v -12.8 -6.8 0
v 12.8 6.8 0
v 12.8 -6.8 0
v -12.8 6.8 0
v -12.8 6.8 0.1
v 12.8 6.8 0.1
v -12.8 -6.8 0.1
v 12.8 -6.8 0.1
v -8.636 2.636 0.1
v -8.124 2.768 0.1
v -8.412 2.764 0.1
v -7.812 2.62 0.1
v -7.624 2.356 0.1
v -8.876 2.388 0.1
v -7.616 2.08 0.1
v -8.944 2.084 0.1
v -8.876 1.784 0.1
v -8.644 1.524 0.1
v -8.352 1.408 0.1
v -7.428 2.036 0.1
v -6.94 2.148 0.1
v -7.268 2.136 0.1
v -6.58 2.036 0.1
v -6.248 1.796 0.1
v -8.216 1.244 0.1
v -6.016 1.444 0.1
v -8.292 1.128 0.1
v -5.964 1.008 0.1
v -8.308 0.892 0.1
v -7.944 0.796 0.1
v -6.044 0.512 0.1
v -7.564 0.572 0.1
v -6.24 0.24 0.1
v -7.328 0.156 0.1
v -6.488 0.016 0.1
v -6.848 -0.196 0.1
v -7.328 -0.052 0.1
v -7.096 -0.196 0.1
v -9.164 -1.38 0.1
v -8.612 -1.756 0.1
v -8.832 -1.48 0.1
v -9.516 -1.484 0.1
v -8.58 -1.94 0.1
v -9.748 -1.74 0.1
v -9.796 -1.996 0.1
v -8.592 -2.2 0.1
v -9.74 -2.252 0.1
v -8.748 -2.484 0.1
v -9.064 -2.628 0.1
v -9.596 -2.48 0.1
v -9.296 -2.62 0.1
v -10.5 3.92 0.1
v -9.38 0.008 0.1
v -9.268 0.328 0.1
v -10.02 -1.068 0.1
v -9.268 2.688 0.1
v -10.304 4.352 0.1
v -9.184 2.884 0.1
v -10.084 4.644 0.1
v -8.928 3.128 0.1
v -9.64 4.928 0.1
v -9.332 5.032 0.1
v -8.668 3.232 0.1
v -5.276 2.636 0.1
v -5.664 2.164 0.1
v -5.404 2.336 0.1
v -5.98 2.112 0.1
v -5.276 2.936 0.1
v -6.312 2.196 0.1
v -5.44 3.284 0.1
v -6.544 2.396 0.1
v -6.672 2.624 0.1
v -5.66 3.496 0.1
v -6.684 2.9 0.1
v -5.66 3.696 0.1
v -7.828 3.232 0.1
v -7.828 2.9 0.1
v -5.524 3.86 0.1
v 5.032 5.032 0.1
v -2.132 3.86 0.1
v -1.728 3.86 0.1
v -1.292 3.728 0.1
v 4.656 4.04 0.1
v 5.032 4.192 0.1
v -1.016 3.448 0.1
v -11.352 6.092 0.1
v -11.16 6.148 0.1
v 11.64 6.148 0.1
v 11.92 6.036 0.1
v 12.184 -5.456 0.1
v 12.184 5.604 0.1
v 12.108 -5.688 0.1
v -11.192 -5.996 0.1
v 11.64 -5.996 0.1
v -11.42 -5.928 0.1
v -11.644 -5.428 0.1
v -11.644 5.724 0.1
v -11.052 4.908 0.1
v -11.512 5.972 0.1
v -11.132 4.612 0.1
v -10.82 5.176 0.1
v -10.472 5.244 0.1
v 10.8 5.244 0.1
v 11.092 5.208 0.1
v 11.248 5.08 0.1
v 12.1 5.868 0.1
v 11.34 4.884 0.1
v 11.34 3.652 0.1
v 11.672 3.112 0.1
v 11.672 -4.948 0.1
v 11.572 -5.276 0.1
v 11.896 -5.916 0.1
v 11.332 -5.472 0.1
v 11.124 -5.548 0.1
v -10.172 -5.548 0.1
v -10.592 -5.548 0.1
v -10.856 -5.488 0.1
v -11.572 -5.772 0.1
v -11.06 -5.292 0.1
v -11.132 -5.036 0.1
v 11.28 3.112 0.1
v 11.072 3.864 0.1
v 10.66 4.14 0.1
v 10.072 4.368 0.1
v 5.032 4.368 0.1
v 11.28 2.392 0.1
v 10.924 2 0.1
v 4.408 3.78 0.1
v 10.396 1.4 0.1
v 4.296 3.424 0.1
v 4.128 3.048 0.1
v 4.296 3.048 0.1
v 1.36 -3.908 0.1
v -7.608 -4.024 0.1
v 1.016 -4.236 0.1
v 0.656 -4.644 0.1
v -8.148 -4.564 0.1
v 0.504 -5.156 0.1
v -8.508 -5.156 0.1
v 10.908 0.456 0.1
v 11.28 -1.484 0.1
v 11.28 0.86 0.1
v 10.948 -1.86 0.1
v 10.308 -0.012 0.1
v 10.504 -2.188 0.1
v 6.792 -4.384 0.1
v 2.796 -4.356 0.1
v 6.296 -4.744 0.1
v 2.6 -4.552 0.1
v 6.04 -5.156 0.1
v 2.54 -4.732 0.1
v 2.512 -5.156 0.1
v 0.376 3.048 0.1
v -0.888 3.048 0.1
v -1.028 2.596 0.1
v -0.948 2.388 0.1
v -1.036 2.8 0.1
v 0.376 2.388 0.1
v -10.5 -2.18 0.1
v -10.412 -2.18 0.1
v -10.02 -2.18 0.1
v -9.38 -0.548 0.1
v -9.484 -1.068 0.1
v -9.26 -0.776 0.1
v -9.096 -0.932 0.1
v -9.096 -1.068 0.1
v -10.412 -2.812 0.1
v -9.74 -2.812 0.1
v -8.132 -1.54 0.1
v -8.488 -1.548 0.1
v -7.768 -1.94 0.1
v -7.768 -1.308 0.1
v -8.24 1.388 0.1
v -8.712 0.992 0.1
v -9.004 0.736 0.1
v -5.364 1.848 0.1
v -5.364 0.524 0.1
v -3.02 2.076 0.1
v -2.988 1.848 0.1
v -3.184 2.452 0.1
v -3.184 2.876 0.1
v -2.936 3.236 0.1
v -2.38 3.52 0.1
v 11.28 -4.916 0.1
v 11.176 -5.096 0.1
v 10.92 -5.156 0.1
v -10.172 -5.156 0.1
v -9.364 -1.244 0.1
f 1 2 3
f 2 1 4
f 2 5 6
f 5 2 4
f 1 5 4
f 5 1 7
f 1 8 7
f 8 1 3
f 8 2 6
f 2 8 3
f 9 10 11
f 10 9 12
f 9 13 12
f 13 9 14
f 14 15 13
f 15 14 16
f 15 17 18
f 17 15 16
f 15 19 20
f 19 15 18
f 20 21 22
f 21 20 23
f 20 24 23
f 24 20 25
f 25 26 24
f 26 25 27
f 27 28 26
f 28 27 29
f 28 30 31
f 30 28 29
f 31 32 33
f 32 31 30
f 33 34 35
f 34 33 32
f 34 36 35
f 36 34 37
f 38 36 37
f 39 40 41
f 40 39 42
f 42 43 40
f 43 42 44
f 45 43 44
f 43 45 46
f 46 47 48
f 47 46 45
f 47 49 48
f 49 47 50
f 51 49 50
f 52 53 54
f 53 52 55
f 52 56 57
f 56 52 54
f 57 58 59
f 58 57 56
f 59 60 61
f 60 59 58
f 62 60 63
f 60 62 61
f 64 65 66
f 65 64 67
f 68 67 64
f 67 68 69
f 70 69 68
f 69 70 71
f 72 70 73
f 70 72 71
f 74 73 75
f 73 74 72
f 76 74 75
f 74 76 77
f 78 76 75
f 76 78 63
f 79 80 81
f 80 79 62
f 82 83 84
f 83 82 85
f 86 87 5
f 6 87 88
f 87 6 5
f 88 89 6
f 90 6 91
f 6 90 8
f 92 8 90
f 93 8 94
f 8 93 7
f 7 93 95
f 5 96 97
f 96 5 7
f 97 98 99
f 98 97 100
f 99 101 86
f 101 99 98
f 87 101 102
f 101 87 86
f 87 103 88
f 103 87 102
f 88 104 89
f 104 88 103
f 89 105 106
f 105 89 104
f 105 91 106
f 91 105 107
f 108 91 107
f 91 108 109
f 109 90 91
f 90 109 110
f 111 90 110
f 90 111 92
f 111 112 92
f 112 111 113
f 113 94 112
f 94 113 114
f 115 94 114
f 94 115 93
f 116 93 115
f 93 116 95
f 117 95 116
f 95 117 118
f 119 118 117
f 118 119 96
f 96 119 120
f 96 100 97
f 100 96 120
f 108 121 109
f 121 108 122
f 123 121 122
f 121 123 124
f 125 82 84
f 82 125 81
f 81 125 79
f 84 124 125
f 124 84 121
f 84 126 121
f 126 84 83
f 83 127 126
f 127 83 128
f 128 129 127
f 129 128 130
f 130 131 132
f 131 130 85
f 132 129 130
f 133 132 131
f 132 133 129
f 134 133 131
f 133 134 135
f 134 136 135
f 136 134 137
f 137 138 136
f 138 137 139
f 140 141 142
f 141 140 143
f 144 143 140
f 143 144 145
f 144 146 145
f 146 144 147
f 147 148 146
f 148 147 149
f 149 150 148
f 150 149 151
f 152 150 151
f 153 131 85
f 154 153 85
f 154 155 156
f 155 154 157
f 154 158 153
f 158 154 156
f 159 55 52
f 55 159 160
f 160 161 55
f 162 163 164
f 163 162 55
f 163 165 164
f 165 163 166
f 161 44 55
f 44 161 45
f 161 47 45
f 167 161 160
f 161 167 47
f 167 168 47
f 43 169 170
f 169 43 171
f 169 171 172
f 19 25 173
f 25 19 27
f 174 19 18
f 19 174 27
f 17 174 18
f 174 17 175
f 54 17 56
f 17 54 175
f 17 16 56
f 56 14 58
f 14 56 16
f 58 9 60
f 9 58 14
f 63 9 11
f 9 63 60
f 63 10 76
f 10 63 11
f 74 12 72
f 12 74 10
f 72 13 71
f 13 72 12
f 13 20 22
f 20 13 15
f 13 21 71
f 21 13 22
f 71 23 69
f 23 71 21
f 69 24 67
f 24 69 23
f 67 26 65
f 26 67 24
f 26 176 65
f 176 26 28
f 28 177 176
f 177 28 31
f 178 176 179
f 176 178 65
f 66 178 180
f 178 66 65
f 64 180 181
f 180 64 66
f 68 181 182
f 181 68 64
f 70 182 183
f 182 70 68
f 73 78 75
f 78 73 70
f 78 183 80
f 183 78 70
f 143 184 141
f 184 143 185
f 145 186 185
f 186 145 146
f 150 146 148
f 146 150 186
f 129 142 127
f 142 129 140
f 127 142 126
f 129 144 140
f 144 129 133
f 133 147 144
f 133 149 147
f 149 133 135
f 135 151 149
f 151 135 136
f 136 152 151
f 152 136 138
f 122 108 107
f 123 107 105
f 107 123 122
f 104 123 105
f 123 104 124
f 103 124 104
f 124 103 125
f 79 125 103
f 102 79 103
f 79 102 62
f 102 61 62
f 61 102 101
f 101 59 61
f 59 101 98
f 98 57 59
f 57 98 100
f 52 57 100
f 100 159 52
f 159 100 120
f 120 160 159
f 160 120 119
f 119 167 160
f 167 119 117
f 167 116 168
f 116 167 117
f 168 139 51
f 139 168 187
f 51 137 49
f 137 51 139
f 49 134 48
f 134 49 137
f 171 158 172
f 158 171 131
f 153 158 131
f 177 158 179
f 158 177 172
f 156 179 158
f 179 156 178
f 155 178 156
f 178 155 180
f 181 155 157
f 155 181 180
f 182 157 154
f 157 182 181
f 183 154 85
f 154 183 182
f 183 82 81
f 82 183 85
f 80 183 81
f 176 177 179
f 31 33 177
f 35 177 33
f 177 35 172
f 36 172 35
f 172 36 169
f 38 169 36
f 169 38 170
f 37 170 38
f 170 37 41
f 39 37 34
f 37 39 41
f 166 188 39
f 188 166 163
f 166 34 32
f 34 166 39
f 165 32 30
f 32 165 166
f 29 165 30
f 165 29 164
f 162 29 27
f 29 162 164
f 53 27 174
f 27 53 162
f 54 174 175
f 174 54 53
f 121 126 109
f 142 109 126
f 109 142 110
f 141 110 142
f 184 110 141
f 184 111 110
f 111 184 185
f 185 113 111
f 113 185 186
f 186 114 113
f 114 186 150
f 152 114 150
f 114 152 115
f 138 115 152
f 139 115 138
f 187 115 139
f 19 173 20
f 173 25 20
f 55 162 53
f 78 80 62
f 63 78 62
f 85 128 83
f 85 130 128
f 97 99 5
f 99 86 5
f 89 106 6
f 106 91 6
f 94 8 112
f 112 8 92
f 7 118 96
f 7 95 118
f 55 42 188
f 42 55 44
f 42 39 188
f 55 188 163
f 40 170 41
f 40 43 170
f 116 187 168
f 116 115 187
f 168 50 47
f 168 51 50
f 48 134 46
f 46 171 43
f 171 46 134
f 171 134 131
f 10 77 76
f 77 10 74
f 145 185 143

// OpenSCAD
// file: ../p/box5-12.scad
use <../lib.scad>
function ldraw_lib__box5_12() = [
// 0 Box with 5 Faces without Any Edges
// 0 Name: box5-12.dat
// 0 Author: Chris Dee [cwdee]
// 0 !LDRAW_ORG Primitive UPDATE 2009-02
// 0 !LICENSE Licensed under CC BY 2.0 and CC BY 4.0 : see CAreadme.txt
// 
// 0 BFC CERTIFY CCW
  [0,"BFC","CERTIFY"],
  [0,"BFC","CCW"],
// 
// 0 !HISTORY 2009-09-03 [PTadmin] Official Update 2009-02
// 
// 
// 4 16 1 1 1 1 1 -1 -1 1 -1 -1 1 1
  [4,16,1,1,1,1,1,-1,-1,1,-1,-1,1,1],
// 4 16 -1 0 1 1 0 1 1 1 1 -1 1 1
  [4,16,-1,0,1,1,0,1,1,1,1,-1,1,1],
// 4 16 -1 0 -1 -1 0 1 -1 1 1 -1 1 -1
  [4,16,-1,0,-1,-1,0,1,-1,1,1,-1,1,-1],
// 4 16 1 0 -1 -1 0 -1 -1 1 -1 1 1 -1
  [4,16,1,0,-1,-1,0,-1,-1,1,-1,1,1,-1],
// 4 16 1 0 1 1 0 -1 1 1 -1 1 1 1
  [4,16,1,0,1,1,0,-1,1,1,-1,1,1,1],
// 0
];
makepoly(ldraw_lib__box5_12(), line=0.2);
// main file
use <../lib.scad>
use <168315e.scad>
function ldraw_lib__168135e() = [
// 0 ~Moved to 168315e
// 0 Name: 168135e.dat
// 0 Author: [PTadmin]
// 0 !LDRAW_ORG Part UPDATE 2012-03
// 0 !LICENSE Licensed under CC BY 4.0 : see CAreadme.txt
// 
// 0 BFC CERTIFY CCW
  [0,"BFC","CERTIFY"],
  [0,"BFC","CCW"],
// 
// 0 !HISTORY 2012-12-28 [PTadmin] Official Update 2012-03
// 
// 
// 0 // Sticker Technic Supercar Mirror
// 1 16 0 0 0 1 0 0 0 1 0 0 0 1 168315e.dat
  [1,16,0,0,0,1,0,0,0,1,0,0,0,1, ldraw_lib__168315e()],
];
makepoly(ldraw_lib__168135e(), line=0.2);
